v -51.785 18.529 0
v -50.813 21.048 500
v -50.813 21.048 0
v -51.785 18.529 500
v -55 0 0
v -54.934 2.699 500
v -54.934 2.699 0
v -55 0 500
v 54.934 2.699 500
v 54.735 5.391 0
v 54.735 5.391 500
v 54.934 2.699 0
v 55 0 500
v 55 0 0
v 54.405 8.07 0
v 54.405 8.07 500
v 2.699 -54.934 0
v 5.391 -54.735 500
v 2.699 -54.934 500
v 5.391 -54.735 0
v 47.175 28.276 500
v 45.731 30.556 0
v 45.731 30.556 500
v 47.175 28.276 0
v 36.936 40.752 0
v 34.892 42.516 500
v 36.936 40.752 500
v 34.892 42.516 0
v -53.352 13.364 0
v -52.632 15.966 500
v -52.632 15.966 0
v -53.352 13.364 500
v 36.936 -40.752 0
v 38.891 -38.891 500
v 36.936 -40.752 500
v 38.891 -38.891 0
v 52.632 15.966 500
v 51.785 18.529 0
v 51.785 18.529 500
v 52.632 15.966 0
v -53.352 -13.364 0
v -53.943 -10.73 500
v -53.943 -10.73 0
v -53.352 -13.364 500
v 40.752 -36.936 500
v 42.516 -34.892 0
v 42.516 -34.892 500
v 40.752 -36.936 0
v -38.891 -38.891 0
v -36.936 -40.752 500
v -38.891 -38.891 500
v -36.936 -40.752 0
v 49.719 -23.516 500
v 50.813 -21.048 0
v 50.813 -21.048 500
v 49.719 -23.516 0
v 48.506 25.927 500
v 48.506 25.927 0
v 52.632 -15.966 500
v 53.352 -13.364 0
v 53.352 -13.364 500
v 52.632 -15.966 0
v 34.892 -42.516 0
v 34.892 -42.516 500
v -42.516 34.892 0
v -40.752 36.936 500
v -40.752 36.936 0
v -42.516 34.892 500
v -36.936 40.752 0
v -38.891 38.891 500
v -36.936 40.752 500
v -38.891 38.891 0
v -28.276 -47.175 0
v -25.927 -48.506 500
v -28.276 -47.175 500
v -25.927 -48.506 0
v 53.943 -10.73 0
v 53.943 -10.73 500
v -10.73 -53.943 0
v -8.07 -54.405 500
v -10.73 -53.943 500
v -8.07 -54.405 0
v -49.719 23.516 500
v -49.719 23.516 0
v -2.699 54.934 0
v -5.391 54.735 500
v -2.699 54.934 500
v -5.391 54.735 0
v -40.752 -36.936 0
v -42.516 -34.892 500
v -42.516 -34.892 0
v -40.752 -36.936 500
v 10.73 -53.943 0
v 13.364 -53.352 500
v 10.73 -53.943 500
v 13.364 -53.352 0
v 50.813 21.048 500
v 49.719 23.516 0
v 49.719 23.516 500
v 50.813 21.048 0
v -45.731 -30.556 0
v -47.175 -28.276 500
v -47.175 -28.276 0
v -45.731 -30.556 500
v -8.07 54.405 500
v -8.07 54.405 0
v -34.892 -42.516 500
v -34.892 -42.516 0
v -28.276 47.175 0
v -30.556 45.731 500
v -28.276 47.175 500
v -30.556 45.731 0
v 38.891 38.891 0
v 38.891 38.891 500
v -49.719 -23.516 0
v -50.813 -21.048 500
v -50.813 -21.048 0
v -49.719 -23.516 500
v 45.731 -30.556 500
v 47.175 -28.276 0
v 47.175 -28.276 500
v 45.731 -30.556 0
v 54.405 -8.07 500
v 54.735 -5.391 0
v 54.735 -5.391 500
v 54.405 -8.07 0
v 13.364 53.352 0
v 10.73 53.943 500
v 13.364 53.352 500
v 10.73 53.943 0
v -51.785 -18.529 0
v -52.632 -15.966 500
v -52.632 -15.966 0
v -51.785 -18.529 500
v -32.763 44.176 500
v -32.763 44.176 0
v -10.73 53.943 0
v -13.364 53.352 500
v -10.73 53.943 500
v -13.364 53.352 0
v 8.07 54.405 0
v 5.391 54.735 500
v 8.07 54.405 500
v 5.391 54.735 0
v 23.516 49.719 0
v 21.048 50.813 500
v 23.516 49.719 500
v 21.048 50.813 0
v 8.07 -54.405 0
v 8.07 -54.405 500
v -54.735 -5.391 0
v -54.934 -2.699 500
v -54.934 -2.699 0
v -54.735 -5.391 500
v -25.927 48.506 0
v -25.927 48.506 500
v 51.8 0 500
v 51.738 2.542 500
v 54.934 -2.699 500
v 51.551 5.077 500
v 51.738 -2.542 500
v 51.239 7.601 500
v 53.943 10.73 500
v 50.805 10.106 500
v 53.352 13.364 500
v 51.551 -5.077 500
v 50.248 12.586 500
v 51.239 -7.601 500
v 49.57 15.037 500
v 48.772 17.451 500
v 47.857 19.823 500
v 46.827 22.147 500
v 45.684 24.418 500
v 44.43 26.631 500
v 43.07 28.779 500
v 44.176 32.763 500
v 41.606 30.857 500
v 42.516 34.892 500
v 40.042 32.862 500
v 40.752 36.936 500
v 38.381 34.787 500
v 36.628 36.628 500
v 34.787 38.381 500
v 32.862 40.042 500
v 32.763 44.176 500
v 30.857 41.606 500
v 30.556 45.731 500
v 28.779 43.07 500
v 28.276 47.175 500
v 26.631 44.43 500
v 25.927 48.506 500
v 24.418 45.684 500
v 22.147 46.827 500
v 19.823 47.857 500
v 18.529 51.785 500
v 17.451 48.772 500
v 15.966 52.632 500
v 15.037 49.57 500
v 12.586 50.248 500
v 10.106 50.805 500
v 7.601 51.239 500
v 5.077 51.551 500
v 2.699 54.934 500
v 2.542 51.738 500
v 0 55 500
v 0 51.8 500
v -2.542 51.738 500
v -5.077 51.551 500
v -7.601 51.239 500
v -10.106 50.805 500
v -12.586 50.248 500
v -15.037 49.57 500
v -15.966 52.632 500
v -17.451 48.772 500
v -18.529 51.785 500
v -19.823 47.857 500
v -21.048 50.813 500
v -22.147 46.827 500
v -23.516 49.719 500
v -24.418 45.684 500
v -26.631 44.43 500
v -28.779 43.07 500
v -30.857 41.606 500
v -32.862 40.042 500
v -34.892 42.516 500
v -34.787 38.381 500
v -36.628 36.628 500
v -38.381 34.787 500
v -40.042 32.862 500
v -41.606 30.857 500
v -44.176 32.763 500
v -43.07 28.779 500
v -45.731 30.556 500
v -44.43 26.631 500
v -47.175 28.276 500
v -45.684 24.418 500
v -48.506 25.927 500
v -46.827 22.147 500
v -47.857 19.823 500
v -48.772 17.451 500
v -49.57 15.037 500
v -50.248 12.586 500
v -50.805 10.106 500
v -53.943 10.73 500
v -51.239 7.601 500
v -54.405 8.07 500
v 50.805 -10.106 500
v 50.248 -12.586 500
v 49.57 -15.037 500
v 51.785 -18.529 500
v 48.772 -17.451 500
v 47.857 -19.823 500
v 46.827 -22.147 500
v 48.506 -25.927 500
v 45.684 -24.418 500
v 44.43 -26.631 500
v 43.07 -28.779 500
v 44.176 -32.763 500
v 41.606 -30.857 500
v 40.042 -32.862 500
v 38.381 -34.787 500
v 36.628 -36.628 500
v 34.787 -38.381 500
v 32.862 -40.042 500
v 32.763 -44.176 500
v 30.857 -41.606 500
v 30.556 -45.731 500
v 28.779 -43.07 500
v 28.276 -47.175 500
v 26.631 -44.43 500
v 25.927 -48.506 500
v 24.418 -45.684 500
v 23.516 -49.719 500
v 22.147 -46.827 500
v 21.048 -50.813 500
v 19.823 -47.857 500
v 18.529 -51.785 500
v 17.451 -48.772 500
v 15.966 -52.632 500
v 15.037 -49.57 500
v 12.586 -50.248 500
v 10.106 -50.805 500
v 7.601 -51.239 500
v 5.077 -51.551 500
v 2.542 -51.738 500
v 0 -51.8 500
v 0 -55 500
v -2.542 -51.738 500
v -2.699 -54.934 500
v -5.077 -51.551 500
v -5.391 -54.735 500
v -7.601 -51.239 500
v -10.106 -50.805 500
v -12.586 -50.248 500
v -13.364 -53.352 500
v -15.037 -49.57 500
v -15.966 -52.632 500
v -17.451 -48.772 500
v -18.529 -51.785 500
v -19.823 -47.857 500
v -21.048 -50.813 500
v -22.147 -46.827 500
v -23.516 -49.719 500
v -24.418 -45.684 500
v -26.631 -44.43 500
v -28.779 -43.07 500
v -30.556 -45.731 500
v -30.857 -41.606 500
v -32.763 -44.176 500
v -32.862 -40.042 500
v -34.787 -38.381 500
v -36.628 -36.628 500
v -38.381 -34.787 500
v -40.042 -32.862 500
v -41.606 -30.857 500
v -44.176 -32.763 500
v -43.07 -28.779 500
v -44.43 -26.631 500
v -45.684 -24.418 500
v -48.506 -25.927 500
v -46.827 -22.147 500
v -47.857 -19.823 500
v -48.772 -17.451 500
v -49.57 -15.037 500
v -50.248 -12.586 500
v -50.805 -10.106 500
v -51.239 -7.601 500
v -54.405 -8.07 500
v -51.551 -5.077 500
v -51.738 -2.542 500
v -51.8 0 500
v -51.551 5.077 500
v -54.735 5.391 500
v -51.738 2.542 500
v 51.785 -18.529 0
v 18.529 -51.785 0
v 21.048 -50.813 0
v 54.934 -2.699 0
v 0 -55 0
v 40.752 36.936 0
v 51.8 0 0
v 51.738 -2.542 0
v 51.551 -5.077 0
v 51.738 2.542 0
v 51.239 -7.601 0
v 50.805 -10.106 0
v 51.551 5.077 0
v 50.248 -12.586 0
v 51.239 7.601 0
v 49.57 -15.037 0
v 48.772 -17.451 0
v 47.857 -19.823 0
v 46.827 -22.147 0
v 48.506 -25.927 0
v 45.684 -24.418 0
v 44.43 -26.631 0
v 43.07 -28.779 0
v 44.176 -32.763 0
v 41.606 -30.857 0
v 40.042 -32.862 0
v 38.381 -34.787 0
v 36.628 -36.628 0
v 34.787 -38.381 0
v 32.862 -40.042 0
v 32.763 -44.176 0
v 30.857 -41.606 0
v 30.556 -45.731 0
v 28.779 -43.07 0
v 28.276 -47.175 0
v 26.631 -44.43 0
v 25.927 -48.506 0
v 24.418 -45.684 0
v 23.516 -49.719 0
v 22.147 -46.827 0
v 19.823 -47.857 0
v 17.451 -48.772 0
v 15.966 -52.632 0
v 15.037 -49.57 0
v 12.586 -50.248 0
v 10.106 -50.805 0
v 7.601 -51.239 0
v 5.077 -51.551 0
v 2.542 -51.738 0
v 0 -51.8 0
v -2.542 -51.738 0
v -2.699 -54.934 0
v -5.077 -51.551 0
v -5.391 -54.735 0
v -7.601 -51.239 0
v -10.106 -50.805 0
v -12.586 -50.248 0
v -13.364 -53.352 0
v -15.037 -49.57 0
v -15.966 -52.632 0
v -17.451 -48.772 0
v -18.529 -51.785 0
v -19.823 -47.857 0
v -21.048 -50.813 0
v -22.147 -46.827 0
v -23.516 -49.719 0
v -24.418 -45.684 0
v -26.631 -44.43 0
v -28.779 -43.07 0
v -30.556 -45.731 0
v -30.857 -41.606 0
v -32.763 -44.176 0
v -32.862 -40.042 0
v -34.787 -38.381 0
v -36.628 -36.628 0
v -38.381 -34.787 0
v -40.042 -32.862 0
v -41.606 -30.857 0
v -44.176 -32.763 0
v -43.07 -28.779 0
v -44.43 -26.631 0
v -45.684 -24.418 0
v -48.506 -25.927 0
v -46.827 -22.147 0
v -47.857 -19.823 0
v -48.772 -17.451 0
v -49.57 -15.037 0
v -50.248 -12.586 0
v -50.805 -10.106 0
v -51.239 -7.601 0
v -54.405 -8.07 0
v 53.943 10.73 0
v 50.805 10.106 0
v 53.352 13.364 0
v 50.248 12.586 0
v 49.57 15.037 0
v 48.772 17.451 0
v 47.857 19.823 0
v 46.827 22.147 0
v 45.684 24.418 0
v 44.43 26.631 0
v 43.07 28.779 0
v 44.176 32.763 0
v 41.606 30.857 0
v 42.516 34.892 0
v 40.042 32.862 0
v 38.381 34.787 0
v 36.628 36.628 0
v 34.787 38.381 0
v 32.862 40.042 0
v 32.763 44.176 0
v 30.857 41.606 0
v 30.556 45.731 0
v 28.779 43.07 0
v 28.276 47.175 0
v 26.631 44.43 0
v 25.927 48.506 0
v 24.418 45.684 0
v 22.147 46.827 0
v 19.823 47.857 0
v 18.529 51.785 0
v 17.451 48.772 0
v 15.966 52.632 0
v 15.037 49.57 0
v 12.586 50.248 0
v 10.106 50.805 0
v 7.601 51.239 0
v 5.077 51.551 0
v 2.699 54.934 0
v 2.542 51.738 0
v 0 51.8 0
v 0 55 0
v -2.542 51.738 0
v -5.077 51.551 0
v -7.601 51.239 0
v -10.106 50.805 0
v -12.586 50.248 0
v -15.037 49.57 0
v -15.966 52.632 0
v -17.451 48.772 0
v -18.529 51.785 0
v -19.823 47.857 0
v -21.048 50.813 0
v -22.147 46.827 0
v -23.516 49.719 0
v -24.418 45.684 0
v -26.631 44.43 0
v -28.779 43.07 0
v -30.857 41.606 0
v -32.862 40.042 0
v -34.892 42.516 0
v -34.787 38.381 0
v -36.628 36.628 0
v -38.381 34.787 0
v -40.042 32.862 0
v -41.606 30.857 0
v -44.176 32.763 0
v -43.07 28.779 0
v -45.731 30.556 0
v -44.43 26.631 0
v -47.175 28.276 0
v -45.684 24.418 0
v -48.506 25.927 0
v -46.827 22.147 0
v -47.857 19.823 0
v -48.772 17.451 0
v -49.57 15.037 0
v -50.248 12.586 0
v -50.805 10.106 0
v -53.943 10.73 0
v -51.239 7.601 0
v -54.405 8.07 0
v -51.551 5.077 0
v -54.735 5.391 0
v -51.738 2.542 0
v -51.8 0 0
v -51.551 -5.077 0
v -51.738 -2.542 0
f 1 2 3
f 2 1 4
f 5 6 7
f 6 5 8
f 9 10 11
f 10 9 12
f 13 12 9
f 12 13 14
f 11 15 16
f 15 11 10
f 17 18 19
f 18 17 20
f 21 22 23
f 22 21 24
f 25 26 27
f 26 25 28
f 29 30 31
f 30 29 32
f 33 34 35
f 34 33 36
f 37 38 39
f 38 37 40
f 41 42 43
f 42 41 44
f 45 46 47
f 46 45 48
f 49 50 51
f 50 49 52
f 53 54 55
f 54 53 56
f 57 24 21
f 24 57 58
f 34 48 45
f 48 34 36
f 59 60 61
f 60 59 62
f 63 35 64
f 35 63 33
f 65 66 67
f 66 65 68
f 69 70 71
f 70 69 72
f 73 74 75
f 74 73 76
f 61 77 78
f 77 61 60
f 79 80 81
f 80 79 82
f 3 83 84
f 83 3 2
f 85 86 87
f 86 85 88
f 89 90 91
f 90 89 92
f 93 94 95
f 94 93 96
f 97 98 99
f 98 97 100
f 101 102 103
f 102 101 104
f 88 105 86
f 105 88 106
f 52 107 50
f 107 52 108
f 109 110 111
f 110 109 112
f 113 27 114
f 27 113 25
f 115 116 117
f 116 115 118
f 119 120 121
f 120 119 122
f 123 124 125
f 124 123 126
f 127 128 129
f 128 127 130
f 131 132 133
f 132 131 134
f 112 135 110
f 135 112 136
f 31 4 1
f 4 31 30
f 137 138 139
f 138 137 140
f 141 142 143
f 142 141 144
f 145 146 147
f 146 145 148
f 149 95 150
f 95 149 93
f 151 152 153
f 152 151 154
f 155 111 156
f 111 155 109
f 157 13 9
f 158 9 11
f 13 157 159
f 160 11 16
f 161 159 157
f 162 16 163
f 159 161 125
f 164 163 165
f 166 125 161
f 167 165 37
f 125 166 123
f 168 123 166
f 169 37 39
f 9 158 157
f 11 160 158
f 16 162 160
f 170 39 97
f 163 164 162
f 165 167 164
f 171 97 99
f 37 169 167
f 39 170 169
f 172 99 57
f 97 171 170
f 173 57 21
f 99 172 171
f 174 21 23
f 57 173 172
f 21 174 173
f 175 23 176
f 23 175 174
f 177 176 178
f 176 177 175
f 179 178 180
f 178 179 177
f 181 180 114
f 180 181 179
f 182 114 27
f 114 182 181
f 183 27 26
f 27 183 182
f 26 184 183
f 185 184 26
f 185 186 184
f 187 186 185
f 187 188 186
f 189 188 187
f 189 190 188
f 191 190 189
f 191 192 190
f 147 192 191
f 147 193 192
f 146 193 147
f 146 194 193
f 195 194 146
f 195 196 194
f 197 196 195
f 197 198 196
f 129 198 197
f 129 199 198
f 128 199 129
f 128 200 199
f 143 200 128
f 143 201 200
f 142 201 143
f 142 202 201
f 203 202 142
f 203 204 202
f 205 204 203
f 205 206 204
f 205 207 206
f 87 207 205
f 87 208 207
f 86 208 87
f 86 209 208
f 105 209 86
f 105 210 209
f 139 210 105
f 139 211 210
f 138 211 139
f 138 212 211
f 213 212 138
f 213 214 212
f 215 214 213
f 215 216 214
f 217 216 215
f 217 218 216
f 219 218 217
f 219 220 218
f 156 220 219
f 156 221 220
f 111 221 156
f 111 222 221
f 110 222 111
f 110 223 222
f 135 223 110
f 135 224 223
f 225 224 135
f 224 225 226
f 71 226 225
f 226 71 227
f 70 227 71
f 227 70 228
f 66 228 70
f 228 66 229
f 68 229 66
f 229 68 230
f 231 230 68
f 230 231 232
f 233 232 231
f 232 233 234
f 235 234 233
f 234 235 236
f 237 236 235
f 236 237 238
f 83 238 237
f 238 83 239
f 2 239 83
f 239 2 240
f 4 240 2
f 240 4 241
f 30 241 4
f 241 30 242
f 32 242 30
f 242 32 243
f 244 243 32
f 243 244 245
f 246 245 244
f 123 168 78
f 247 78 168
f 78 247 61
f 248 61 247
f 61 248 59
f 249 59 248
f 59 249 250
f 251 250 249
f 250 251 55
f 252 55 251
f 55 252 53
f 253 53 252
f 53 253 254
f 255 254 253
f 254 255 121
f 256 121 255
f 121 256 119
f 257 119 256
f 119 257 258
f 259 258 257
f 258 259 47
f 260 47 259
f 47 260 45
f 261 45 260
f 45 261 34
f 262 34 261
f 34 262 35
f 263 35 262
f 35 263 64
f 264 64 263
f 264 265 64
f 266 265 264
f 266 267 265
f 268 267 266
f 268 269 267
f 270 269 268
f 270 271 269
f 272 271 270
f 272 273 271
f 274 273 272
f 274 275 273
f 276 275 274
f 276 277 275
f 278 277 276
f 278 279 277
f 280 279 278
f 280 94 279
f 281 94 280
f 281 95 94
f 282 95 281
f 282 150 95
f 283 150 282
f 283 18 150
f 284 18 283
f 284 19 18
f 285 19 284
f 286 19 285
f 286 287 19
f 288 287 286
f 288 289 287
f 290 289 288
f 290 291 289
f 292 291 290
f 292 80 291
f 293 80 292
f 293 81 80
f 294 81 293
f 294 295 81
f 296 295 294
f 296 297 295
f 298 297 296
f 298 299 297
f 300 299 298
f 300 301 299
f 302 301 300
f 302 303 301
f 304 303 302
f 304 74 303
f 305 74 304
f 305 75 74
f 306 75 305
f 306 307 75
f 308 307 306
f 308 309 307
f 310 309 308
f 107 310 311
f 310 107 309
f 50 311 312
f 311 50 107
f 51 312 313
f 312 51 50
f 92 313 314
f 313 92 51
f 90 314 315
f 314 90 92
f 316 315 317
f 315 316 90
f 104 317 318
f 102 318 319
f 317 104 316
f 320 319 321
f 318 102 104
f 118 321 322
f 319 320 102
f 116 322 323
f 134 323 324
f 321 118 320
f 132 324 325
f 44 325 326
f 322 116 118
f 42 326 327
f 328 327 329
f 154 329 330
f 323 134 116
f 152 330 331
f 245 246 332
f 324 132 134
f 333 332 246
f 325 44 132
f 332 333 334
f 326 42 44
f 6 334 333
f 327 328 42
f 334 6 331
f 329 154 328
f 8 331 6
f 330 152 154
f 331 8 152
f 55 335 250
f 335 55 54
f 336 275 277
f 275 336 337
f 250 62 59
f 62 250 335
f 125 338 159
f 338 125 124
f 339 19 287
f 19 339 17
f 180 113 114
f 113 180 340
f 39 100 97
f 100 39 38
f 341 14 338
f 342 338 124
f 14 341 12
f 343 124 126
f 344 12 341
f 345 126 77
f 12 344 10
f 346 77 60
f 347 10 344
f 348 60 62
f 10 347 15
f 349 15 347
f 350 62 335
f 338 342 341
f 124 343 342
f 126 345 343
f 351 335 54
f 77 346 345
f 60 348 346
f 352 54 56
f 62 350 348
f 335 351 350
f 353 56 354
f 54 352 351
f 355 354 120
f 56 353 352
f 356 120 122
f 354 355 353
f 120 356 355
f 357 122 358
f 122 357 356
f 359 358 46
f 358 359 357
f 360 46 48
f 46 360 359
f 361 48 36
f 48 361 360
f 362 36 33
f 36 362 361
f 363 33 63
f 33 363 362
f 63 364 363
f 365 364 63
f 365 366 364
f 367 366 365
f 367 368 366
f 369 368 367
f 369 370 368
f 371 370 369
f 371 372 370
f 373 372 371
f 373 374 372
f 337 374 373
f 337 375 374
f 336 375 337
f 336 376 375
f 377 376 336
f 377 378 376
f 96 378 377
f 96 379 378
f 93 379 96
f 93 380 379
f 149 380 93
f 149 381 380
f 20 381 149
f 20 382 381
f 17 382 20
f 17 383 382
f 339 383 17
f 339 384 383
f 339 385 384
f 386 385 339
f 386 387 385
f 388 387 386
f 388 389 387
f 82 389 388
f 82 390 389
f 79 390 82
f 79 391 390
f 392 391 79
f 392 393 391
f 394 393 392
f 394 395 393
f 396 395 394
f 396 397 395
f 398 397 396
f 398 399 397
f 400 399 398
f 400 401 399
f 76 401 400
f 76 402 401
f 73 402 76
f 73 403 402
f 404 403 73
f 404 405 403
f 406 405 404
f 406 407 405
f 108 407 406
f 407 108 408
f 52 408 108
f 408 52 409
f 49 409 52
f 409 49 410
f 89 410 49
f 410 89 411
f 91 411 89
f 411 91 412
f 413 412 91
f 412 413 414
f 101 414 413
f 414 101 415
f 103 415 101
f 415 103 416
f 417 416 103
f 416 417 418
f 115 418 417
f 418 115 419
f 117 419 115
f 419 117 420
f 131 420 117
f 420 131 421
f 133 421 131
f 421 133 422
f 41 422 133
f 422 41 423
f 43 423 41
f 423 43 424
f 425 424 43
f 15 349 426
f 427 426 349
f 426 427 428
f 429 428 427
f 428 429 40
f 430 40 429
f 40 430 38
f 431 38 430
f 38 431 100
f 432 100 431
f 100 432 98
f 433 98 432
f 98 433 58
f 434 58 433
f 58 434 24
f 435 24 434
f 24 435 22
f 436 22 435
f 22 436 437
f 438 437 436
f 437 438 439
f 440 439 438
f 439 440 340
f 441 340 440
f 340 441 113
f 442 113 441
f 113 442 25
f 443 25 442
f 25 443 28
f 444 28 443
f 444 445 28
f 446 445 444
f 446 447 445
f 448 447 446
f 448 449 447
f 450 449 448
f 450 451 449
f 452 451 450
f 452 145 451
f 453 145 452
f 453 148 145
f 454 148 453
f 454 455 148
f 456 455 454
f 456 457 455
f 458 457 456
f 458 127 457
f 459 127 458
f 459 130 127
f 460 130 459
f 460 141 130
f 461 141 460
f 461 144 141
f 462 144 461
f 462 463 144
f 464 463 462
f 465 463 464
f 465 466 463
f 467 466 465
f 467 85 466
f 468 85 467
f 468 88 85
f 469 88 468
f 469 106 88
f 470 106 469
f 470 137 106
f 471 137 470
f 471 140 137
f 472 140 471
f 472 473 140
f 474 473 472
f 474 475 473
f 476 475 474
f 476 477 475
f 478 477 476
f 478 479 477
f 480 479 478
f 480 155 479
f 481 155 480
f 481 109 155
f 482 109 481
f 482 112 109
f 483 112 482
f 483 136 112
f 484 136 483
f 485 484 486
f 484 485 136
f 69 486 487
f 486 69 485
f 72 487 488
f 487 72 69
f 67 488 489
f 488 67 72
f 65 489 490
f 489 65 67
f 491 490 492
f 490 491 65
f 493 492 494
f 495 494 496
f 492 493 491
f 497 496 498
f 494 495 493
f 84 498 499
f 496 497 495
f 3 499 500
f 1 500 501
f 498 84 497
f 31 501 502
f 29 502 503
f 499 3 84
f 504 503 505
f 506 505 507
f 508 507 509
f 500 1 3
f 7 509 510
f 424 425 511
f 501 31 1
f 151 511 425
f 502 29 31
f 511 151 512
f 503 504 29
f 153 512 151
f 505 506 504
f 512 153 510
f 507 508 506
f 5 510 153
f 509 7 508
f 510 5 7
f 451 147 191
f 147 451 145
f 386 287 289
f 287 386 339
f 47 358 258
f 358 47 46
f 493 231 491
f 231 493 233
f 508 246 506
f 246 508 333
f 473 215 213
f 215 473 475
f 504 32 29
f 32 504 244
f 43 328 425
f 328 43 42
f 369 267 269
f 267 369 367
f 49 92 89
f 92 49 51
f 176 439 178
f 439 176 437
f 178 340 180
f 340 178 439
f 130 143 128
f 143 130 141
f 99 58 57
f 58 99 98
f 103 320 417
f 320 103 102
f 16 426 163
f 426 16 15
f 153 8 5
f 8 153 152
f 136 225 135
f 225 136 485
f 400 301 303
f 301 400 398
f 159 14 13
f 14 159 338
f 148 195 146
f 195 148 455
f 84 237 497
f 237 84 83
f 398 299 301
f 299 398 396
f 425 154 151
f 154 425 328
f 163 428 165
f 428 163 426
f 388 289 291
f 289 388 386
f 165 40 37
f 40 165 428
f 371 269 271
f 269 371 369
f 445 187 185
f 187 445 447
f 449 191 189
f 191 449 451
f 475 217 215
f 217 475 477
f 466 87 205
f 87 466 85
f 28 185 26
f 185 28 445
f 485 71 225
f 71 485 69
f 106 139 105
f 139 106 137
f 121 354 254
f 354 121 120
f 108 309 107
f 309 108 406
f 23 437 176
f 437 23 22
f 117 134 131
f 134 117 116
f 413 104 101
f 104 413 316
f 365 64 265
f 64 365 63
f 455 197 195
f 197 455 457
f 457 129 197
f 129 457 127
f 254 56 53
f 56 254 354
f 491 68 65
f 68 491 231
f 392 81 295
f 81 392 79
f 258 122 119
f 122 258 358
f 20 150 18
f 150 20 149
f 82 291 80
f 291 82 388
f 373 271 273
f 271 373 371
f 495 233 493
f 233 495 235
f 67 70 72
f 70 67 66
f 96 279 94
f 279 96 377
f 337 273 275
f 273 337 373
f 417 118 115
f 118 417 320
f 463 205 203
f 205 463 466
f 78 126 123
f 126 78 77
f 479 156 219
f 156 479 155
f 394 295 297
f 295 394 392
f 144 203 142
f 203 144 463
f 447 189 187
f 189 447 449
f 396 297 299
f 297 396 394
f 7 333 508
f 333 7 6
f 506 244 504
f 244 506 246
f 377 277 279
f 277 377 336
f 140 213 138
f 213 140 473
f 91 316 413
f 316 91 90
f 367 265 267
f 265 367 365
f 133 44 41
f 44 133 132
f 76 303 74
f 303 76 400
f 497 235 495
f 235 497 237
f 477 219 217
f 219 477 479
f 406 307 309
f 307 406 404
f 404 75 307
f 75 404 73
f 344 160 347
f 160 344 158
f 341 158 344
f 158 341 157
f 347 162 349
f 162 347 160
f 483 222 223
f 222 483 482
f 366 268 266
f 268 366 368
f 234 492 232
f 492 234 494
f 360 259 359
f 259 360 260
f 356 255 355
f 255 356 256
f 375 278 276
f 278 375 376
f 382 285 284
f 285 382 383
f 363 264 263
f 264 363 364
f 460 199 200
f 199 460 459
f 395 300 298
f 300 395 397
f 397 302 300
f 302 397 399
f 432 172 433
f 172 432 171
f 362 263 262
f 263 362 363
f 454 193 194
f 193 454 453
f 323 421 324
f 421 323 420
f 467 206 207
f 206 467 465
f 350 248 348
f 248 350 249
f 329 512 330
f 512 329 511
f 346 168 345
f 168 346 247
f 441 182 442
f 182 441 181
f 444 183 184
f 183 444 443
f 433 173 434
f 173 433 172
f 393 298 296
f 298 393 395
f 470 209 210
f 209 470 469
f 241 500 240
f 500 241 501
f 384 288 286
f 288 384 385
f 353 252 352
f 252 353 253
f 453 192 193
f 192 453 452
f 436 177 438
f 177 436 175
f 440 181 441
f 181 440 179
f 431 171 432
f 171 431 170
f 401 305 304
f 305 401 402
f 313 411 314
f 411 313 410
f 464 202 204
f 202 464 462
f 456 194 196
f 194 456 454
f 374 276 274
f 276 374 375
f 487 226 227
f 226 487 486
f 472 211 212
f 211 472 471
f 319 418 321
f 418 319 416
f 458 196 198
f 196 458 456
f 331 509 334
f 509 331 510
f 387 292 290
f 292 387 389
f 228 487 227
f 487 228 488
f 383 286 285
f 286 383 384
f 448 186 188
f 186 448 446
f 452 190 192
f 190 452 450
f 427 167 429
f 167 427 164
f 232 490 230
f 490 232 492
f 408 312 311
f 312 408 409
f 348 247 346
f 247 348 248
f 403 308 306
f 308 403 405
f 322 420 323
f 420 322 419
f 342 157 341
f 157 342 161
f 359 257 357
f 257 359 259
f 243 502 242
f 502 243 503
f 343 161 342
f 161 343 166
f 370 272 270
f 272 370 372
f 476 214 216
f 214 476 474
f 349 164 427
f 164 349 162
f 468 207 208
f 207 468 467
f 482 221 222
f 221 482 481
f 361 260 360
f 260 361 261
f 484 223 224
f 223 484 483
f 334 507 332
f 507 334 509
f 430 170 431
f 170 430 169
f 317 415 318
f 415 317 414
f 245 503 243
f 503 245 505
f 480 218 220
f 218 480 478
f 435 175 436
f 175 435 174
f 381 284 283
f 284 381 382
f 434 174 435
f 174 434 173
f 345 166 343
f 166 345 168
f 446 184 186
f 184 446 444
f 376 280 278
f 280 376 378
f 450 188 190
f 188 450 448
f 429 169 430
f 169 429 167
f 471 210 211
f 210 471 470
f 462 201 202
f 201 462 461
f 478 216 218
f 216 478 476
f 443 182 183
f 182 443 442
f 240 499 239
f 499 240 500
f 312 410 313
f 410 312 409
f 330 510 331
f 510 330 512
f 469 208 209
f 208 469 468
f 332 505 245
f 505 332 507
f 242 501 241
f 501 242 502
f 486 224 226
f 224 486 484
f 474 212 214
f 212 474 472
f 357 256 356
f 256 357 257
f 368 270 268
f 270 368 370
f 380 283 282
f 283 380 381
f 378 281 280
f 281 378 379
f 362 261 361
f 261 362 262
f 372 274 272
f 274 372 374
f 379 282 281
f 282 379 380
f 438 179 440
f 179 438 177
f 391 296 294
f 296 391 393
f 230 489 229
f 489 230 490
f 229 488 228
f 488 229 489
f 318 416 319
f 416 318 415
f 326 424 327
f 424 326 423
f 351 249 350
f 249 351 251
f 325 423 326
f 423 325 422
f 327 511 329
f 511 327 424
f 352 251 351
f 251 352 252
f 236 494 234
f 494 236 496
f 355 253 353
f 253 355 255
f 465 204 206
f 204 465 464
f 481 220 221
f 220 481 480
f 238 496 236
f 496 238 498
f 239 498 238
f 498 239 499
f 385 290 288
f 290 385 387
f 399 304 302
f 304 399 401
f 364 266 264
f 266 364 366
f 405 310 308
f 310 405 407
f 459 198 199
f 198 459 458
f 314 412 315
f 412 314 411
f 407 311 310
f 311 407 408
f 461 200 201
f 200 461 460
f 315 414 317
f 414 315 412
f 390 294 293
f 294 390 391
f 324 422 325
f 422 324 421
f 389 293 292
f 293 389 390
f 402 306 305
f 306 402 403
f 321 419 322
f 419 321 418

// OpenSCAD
$fn = 128;

// HT 110 pipe (approx.): OD 110 mm, wall 3.2 mm, length 500 mm
od = 110;
wall = 3.2;
id = od - 2*wall;
len = 500;

difference() {
    cylinder(h = len, d = od);
    translate([0,0,-0.1]) cylinder(h = len + 0.2, d = id);
}
